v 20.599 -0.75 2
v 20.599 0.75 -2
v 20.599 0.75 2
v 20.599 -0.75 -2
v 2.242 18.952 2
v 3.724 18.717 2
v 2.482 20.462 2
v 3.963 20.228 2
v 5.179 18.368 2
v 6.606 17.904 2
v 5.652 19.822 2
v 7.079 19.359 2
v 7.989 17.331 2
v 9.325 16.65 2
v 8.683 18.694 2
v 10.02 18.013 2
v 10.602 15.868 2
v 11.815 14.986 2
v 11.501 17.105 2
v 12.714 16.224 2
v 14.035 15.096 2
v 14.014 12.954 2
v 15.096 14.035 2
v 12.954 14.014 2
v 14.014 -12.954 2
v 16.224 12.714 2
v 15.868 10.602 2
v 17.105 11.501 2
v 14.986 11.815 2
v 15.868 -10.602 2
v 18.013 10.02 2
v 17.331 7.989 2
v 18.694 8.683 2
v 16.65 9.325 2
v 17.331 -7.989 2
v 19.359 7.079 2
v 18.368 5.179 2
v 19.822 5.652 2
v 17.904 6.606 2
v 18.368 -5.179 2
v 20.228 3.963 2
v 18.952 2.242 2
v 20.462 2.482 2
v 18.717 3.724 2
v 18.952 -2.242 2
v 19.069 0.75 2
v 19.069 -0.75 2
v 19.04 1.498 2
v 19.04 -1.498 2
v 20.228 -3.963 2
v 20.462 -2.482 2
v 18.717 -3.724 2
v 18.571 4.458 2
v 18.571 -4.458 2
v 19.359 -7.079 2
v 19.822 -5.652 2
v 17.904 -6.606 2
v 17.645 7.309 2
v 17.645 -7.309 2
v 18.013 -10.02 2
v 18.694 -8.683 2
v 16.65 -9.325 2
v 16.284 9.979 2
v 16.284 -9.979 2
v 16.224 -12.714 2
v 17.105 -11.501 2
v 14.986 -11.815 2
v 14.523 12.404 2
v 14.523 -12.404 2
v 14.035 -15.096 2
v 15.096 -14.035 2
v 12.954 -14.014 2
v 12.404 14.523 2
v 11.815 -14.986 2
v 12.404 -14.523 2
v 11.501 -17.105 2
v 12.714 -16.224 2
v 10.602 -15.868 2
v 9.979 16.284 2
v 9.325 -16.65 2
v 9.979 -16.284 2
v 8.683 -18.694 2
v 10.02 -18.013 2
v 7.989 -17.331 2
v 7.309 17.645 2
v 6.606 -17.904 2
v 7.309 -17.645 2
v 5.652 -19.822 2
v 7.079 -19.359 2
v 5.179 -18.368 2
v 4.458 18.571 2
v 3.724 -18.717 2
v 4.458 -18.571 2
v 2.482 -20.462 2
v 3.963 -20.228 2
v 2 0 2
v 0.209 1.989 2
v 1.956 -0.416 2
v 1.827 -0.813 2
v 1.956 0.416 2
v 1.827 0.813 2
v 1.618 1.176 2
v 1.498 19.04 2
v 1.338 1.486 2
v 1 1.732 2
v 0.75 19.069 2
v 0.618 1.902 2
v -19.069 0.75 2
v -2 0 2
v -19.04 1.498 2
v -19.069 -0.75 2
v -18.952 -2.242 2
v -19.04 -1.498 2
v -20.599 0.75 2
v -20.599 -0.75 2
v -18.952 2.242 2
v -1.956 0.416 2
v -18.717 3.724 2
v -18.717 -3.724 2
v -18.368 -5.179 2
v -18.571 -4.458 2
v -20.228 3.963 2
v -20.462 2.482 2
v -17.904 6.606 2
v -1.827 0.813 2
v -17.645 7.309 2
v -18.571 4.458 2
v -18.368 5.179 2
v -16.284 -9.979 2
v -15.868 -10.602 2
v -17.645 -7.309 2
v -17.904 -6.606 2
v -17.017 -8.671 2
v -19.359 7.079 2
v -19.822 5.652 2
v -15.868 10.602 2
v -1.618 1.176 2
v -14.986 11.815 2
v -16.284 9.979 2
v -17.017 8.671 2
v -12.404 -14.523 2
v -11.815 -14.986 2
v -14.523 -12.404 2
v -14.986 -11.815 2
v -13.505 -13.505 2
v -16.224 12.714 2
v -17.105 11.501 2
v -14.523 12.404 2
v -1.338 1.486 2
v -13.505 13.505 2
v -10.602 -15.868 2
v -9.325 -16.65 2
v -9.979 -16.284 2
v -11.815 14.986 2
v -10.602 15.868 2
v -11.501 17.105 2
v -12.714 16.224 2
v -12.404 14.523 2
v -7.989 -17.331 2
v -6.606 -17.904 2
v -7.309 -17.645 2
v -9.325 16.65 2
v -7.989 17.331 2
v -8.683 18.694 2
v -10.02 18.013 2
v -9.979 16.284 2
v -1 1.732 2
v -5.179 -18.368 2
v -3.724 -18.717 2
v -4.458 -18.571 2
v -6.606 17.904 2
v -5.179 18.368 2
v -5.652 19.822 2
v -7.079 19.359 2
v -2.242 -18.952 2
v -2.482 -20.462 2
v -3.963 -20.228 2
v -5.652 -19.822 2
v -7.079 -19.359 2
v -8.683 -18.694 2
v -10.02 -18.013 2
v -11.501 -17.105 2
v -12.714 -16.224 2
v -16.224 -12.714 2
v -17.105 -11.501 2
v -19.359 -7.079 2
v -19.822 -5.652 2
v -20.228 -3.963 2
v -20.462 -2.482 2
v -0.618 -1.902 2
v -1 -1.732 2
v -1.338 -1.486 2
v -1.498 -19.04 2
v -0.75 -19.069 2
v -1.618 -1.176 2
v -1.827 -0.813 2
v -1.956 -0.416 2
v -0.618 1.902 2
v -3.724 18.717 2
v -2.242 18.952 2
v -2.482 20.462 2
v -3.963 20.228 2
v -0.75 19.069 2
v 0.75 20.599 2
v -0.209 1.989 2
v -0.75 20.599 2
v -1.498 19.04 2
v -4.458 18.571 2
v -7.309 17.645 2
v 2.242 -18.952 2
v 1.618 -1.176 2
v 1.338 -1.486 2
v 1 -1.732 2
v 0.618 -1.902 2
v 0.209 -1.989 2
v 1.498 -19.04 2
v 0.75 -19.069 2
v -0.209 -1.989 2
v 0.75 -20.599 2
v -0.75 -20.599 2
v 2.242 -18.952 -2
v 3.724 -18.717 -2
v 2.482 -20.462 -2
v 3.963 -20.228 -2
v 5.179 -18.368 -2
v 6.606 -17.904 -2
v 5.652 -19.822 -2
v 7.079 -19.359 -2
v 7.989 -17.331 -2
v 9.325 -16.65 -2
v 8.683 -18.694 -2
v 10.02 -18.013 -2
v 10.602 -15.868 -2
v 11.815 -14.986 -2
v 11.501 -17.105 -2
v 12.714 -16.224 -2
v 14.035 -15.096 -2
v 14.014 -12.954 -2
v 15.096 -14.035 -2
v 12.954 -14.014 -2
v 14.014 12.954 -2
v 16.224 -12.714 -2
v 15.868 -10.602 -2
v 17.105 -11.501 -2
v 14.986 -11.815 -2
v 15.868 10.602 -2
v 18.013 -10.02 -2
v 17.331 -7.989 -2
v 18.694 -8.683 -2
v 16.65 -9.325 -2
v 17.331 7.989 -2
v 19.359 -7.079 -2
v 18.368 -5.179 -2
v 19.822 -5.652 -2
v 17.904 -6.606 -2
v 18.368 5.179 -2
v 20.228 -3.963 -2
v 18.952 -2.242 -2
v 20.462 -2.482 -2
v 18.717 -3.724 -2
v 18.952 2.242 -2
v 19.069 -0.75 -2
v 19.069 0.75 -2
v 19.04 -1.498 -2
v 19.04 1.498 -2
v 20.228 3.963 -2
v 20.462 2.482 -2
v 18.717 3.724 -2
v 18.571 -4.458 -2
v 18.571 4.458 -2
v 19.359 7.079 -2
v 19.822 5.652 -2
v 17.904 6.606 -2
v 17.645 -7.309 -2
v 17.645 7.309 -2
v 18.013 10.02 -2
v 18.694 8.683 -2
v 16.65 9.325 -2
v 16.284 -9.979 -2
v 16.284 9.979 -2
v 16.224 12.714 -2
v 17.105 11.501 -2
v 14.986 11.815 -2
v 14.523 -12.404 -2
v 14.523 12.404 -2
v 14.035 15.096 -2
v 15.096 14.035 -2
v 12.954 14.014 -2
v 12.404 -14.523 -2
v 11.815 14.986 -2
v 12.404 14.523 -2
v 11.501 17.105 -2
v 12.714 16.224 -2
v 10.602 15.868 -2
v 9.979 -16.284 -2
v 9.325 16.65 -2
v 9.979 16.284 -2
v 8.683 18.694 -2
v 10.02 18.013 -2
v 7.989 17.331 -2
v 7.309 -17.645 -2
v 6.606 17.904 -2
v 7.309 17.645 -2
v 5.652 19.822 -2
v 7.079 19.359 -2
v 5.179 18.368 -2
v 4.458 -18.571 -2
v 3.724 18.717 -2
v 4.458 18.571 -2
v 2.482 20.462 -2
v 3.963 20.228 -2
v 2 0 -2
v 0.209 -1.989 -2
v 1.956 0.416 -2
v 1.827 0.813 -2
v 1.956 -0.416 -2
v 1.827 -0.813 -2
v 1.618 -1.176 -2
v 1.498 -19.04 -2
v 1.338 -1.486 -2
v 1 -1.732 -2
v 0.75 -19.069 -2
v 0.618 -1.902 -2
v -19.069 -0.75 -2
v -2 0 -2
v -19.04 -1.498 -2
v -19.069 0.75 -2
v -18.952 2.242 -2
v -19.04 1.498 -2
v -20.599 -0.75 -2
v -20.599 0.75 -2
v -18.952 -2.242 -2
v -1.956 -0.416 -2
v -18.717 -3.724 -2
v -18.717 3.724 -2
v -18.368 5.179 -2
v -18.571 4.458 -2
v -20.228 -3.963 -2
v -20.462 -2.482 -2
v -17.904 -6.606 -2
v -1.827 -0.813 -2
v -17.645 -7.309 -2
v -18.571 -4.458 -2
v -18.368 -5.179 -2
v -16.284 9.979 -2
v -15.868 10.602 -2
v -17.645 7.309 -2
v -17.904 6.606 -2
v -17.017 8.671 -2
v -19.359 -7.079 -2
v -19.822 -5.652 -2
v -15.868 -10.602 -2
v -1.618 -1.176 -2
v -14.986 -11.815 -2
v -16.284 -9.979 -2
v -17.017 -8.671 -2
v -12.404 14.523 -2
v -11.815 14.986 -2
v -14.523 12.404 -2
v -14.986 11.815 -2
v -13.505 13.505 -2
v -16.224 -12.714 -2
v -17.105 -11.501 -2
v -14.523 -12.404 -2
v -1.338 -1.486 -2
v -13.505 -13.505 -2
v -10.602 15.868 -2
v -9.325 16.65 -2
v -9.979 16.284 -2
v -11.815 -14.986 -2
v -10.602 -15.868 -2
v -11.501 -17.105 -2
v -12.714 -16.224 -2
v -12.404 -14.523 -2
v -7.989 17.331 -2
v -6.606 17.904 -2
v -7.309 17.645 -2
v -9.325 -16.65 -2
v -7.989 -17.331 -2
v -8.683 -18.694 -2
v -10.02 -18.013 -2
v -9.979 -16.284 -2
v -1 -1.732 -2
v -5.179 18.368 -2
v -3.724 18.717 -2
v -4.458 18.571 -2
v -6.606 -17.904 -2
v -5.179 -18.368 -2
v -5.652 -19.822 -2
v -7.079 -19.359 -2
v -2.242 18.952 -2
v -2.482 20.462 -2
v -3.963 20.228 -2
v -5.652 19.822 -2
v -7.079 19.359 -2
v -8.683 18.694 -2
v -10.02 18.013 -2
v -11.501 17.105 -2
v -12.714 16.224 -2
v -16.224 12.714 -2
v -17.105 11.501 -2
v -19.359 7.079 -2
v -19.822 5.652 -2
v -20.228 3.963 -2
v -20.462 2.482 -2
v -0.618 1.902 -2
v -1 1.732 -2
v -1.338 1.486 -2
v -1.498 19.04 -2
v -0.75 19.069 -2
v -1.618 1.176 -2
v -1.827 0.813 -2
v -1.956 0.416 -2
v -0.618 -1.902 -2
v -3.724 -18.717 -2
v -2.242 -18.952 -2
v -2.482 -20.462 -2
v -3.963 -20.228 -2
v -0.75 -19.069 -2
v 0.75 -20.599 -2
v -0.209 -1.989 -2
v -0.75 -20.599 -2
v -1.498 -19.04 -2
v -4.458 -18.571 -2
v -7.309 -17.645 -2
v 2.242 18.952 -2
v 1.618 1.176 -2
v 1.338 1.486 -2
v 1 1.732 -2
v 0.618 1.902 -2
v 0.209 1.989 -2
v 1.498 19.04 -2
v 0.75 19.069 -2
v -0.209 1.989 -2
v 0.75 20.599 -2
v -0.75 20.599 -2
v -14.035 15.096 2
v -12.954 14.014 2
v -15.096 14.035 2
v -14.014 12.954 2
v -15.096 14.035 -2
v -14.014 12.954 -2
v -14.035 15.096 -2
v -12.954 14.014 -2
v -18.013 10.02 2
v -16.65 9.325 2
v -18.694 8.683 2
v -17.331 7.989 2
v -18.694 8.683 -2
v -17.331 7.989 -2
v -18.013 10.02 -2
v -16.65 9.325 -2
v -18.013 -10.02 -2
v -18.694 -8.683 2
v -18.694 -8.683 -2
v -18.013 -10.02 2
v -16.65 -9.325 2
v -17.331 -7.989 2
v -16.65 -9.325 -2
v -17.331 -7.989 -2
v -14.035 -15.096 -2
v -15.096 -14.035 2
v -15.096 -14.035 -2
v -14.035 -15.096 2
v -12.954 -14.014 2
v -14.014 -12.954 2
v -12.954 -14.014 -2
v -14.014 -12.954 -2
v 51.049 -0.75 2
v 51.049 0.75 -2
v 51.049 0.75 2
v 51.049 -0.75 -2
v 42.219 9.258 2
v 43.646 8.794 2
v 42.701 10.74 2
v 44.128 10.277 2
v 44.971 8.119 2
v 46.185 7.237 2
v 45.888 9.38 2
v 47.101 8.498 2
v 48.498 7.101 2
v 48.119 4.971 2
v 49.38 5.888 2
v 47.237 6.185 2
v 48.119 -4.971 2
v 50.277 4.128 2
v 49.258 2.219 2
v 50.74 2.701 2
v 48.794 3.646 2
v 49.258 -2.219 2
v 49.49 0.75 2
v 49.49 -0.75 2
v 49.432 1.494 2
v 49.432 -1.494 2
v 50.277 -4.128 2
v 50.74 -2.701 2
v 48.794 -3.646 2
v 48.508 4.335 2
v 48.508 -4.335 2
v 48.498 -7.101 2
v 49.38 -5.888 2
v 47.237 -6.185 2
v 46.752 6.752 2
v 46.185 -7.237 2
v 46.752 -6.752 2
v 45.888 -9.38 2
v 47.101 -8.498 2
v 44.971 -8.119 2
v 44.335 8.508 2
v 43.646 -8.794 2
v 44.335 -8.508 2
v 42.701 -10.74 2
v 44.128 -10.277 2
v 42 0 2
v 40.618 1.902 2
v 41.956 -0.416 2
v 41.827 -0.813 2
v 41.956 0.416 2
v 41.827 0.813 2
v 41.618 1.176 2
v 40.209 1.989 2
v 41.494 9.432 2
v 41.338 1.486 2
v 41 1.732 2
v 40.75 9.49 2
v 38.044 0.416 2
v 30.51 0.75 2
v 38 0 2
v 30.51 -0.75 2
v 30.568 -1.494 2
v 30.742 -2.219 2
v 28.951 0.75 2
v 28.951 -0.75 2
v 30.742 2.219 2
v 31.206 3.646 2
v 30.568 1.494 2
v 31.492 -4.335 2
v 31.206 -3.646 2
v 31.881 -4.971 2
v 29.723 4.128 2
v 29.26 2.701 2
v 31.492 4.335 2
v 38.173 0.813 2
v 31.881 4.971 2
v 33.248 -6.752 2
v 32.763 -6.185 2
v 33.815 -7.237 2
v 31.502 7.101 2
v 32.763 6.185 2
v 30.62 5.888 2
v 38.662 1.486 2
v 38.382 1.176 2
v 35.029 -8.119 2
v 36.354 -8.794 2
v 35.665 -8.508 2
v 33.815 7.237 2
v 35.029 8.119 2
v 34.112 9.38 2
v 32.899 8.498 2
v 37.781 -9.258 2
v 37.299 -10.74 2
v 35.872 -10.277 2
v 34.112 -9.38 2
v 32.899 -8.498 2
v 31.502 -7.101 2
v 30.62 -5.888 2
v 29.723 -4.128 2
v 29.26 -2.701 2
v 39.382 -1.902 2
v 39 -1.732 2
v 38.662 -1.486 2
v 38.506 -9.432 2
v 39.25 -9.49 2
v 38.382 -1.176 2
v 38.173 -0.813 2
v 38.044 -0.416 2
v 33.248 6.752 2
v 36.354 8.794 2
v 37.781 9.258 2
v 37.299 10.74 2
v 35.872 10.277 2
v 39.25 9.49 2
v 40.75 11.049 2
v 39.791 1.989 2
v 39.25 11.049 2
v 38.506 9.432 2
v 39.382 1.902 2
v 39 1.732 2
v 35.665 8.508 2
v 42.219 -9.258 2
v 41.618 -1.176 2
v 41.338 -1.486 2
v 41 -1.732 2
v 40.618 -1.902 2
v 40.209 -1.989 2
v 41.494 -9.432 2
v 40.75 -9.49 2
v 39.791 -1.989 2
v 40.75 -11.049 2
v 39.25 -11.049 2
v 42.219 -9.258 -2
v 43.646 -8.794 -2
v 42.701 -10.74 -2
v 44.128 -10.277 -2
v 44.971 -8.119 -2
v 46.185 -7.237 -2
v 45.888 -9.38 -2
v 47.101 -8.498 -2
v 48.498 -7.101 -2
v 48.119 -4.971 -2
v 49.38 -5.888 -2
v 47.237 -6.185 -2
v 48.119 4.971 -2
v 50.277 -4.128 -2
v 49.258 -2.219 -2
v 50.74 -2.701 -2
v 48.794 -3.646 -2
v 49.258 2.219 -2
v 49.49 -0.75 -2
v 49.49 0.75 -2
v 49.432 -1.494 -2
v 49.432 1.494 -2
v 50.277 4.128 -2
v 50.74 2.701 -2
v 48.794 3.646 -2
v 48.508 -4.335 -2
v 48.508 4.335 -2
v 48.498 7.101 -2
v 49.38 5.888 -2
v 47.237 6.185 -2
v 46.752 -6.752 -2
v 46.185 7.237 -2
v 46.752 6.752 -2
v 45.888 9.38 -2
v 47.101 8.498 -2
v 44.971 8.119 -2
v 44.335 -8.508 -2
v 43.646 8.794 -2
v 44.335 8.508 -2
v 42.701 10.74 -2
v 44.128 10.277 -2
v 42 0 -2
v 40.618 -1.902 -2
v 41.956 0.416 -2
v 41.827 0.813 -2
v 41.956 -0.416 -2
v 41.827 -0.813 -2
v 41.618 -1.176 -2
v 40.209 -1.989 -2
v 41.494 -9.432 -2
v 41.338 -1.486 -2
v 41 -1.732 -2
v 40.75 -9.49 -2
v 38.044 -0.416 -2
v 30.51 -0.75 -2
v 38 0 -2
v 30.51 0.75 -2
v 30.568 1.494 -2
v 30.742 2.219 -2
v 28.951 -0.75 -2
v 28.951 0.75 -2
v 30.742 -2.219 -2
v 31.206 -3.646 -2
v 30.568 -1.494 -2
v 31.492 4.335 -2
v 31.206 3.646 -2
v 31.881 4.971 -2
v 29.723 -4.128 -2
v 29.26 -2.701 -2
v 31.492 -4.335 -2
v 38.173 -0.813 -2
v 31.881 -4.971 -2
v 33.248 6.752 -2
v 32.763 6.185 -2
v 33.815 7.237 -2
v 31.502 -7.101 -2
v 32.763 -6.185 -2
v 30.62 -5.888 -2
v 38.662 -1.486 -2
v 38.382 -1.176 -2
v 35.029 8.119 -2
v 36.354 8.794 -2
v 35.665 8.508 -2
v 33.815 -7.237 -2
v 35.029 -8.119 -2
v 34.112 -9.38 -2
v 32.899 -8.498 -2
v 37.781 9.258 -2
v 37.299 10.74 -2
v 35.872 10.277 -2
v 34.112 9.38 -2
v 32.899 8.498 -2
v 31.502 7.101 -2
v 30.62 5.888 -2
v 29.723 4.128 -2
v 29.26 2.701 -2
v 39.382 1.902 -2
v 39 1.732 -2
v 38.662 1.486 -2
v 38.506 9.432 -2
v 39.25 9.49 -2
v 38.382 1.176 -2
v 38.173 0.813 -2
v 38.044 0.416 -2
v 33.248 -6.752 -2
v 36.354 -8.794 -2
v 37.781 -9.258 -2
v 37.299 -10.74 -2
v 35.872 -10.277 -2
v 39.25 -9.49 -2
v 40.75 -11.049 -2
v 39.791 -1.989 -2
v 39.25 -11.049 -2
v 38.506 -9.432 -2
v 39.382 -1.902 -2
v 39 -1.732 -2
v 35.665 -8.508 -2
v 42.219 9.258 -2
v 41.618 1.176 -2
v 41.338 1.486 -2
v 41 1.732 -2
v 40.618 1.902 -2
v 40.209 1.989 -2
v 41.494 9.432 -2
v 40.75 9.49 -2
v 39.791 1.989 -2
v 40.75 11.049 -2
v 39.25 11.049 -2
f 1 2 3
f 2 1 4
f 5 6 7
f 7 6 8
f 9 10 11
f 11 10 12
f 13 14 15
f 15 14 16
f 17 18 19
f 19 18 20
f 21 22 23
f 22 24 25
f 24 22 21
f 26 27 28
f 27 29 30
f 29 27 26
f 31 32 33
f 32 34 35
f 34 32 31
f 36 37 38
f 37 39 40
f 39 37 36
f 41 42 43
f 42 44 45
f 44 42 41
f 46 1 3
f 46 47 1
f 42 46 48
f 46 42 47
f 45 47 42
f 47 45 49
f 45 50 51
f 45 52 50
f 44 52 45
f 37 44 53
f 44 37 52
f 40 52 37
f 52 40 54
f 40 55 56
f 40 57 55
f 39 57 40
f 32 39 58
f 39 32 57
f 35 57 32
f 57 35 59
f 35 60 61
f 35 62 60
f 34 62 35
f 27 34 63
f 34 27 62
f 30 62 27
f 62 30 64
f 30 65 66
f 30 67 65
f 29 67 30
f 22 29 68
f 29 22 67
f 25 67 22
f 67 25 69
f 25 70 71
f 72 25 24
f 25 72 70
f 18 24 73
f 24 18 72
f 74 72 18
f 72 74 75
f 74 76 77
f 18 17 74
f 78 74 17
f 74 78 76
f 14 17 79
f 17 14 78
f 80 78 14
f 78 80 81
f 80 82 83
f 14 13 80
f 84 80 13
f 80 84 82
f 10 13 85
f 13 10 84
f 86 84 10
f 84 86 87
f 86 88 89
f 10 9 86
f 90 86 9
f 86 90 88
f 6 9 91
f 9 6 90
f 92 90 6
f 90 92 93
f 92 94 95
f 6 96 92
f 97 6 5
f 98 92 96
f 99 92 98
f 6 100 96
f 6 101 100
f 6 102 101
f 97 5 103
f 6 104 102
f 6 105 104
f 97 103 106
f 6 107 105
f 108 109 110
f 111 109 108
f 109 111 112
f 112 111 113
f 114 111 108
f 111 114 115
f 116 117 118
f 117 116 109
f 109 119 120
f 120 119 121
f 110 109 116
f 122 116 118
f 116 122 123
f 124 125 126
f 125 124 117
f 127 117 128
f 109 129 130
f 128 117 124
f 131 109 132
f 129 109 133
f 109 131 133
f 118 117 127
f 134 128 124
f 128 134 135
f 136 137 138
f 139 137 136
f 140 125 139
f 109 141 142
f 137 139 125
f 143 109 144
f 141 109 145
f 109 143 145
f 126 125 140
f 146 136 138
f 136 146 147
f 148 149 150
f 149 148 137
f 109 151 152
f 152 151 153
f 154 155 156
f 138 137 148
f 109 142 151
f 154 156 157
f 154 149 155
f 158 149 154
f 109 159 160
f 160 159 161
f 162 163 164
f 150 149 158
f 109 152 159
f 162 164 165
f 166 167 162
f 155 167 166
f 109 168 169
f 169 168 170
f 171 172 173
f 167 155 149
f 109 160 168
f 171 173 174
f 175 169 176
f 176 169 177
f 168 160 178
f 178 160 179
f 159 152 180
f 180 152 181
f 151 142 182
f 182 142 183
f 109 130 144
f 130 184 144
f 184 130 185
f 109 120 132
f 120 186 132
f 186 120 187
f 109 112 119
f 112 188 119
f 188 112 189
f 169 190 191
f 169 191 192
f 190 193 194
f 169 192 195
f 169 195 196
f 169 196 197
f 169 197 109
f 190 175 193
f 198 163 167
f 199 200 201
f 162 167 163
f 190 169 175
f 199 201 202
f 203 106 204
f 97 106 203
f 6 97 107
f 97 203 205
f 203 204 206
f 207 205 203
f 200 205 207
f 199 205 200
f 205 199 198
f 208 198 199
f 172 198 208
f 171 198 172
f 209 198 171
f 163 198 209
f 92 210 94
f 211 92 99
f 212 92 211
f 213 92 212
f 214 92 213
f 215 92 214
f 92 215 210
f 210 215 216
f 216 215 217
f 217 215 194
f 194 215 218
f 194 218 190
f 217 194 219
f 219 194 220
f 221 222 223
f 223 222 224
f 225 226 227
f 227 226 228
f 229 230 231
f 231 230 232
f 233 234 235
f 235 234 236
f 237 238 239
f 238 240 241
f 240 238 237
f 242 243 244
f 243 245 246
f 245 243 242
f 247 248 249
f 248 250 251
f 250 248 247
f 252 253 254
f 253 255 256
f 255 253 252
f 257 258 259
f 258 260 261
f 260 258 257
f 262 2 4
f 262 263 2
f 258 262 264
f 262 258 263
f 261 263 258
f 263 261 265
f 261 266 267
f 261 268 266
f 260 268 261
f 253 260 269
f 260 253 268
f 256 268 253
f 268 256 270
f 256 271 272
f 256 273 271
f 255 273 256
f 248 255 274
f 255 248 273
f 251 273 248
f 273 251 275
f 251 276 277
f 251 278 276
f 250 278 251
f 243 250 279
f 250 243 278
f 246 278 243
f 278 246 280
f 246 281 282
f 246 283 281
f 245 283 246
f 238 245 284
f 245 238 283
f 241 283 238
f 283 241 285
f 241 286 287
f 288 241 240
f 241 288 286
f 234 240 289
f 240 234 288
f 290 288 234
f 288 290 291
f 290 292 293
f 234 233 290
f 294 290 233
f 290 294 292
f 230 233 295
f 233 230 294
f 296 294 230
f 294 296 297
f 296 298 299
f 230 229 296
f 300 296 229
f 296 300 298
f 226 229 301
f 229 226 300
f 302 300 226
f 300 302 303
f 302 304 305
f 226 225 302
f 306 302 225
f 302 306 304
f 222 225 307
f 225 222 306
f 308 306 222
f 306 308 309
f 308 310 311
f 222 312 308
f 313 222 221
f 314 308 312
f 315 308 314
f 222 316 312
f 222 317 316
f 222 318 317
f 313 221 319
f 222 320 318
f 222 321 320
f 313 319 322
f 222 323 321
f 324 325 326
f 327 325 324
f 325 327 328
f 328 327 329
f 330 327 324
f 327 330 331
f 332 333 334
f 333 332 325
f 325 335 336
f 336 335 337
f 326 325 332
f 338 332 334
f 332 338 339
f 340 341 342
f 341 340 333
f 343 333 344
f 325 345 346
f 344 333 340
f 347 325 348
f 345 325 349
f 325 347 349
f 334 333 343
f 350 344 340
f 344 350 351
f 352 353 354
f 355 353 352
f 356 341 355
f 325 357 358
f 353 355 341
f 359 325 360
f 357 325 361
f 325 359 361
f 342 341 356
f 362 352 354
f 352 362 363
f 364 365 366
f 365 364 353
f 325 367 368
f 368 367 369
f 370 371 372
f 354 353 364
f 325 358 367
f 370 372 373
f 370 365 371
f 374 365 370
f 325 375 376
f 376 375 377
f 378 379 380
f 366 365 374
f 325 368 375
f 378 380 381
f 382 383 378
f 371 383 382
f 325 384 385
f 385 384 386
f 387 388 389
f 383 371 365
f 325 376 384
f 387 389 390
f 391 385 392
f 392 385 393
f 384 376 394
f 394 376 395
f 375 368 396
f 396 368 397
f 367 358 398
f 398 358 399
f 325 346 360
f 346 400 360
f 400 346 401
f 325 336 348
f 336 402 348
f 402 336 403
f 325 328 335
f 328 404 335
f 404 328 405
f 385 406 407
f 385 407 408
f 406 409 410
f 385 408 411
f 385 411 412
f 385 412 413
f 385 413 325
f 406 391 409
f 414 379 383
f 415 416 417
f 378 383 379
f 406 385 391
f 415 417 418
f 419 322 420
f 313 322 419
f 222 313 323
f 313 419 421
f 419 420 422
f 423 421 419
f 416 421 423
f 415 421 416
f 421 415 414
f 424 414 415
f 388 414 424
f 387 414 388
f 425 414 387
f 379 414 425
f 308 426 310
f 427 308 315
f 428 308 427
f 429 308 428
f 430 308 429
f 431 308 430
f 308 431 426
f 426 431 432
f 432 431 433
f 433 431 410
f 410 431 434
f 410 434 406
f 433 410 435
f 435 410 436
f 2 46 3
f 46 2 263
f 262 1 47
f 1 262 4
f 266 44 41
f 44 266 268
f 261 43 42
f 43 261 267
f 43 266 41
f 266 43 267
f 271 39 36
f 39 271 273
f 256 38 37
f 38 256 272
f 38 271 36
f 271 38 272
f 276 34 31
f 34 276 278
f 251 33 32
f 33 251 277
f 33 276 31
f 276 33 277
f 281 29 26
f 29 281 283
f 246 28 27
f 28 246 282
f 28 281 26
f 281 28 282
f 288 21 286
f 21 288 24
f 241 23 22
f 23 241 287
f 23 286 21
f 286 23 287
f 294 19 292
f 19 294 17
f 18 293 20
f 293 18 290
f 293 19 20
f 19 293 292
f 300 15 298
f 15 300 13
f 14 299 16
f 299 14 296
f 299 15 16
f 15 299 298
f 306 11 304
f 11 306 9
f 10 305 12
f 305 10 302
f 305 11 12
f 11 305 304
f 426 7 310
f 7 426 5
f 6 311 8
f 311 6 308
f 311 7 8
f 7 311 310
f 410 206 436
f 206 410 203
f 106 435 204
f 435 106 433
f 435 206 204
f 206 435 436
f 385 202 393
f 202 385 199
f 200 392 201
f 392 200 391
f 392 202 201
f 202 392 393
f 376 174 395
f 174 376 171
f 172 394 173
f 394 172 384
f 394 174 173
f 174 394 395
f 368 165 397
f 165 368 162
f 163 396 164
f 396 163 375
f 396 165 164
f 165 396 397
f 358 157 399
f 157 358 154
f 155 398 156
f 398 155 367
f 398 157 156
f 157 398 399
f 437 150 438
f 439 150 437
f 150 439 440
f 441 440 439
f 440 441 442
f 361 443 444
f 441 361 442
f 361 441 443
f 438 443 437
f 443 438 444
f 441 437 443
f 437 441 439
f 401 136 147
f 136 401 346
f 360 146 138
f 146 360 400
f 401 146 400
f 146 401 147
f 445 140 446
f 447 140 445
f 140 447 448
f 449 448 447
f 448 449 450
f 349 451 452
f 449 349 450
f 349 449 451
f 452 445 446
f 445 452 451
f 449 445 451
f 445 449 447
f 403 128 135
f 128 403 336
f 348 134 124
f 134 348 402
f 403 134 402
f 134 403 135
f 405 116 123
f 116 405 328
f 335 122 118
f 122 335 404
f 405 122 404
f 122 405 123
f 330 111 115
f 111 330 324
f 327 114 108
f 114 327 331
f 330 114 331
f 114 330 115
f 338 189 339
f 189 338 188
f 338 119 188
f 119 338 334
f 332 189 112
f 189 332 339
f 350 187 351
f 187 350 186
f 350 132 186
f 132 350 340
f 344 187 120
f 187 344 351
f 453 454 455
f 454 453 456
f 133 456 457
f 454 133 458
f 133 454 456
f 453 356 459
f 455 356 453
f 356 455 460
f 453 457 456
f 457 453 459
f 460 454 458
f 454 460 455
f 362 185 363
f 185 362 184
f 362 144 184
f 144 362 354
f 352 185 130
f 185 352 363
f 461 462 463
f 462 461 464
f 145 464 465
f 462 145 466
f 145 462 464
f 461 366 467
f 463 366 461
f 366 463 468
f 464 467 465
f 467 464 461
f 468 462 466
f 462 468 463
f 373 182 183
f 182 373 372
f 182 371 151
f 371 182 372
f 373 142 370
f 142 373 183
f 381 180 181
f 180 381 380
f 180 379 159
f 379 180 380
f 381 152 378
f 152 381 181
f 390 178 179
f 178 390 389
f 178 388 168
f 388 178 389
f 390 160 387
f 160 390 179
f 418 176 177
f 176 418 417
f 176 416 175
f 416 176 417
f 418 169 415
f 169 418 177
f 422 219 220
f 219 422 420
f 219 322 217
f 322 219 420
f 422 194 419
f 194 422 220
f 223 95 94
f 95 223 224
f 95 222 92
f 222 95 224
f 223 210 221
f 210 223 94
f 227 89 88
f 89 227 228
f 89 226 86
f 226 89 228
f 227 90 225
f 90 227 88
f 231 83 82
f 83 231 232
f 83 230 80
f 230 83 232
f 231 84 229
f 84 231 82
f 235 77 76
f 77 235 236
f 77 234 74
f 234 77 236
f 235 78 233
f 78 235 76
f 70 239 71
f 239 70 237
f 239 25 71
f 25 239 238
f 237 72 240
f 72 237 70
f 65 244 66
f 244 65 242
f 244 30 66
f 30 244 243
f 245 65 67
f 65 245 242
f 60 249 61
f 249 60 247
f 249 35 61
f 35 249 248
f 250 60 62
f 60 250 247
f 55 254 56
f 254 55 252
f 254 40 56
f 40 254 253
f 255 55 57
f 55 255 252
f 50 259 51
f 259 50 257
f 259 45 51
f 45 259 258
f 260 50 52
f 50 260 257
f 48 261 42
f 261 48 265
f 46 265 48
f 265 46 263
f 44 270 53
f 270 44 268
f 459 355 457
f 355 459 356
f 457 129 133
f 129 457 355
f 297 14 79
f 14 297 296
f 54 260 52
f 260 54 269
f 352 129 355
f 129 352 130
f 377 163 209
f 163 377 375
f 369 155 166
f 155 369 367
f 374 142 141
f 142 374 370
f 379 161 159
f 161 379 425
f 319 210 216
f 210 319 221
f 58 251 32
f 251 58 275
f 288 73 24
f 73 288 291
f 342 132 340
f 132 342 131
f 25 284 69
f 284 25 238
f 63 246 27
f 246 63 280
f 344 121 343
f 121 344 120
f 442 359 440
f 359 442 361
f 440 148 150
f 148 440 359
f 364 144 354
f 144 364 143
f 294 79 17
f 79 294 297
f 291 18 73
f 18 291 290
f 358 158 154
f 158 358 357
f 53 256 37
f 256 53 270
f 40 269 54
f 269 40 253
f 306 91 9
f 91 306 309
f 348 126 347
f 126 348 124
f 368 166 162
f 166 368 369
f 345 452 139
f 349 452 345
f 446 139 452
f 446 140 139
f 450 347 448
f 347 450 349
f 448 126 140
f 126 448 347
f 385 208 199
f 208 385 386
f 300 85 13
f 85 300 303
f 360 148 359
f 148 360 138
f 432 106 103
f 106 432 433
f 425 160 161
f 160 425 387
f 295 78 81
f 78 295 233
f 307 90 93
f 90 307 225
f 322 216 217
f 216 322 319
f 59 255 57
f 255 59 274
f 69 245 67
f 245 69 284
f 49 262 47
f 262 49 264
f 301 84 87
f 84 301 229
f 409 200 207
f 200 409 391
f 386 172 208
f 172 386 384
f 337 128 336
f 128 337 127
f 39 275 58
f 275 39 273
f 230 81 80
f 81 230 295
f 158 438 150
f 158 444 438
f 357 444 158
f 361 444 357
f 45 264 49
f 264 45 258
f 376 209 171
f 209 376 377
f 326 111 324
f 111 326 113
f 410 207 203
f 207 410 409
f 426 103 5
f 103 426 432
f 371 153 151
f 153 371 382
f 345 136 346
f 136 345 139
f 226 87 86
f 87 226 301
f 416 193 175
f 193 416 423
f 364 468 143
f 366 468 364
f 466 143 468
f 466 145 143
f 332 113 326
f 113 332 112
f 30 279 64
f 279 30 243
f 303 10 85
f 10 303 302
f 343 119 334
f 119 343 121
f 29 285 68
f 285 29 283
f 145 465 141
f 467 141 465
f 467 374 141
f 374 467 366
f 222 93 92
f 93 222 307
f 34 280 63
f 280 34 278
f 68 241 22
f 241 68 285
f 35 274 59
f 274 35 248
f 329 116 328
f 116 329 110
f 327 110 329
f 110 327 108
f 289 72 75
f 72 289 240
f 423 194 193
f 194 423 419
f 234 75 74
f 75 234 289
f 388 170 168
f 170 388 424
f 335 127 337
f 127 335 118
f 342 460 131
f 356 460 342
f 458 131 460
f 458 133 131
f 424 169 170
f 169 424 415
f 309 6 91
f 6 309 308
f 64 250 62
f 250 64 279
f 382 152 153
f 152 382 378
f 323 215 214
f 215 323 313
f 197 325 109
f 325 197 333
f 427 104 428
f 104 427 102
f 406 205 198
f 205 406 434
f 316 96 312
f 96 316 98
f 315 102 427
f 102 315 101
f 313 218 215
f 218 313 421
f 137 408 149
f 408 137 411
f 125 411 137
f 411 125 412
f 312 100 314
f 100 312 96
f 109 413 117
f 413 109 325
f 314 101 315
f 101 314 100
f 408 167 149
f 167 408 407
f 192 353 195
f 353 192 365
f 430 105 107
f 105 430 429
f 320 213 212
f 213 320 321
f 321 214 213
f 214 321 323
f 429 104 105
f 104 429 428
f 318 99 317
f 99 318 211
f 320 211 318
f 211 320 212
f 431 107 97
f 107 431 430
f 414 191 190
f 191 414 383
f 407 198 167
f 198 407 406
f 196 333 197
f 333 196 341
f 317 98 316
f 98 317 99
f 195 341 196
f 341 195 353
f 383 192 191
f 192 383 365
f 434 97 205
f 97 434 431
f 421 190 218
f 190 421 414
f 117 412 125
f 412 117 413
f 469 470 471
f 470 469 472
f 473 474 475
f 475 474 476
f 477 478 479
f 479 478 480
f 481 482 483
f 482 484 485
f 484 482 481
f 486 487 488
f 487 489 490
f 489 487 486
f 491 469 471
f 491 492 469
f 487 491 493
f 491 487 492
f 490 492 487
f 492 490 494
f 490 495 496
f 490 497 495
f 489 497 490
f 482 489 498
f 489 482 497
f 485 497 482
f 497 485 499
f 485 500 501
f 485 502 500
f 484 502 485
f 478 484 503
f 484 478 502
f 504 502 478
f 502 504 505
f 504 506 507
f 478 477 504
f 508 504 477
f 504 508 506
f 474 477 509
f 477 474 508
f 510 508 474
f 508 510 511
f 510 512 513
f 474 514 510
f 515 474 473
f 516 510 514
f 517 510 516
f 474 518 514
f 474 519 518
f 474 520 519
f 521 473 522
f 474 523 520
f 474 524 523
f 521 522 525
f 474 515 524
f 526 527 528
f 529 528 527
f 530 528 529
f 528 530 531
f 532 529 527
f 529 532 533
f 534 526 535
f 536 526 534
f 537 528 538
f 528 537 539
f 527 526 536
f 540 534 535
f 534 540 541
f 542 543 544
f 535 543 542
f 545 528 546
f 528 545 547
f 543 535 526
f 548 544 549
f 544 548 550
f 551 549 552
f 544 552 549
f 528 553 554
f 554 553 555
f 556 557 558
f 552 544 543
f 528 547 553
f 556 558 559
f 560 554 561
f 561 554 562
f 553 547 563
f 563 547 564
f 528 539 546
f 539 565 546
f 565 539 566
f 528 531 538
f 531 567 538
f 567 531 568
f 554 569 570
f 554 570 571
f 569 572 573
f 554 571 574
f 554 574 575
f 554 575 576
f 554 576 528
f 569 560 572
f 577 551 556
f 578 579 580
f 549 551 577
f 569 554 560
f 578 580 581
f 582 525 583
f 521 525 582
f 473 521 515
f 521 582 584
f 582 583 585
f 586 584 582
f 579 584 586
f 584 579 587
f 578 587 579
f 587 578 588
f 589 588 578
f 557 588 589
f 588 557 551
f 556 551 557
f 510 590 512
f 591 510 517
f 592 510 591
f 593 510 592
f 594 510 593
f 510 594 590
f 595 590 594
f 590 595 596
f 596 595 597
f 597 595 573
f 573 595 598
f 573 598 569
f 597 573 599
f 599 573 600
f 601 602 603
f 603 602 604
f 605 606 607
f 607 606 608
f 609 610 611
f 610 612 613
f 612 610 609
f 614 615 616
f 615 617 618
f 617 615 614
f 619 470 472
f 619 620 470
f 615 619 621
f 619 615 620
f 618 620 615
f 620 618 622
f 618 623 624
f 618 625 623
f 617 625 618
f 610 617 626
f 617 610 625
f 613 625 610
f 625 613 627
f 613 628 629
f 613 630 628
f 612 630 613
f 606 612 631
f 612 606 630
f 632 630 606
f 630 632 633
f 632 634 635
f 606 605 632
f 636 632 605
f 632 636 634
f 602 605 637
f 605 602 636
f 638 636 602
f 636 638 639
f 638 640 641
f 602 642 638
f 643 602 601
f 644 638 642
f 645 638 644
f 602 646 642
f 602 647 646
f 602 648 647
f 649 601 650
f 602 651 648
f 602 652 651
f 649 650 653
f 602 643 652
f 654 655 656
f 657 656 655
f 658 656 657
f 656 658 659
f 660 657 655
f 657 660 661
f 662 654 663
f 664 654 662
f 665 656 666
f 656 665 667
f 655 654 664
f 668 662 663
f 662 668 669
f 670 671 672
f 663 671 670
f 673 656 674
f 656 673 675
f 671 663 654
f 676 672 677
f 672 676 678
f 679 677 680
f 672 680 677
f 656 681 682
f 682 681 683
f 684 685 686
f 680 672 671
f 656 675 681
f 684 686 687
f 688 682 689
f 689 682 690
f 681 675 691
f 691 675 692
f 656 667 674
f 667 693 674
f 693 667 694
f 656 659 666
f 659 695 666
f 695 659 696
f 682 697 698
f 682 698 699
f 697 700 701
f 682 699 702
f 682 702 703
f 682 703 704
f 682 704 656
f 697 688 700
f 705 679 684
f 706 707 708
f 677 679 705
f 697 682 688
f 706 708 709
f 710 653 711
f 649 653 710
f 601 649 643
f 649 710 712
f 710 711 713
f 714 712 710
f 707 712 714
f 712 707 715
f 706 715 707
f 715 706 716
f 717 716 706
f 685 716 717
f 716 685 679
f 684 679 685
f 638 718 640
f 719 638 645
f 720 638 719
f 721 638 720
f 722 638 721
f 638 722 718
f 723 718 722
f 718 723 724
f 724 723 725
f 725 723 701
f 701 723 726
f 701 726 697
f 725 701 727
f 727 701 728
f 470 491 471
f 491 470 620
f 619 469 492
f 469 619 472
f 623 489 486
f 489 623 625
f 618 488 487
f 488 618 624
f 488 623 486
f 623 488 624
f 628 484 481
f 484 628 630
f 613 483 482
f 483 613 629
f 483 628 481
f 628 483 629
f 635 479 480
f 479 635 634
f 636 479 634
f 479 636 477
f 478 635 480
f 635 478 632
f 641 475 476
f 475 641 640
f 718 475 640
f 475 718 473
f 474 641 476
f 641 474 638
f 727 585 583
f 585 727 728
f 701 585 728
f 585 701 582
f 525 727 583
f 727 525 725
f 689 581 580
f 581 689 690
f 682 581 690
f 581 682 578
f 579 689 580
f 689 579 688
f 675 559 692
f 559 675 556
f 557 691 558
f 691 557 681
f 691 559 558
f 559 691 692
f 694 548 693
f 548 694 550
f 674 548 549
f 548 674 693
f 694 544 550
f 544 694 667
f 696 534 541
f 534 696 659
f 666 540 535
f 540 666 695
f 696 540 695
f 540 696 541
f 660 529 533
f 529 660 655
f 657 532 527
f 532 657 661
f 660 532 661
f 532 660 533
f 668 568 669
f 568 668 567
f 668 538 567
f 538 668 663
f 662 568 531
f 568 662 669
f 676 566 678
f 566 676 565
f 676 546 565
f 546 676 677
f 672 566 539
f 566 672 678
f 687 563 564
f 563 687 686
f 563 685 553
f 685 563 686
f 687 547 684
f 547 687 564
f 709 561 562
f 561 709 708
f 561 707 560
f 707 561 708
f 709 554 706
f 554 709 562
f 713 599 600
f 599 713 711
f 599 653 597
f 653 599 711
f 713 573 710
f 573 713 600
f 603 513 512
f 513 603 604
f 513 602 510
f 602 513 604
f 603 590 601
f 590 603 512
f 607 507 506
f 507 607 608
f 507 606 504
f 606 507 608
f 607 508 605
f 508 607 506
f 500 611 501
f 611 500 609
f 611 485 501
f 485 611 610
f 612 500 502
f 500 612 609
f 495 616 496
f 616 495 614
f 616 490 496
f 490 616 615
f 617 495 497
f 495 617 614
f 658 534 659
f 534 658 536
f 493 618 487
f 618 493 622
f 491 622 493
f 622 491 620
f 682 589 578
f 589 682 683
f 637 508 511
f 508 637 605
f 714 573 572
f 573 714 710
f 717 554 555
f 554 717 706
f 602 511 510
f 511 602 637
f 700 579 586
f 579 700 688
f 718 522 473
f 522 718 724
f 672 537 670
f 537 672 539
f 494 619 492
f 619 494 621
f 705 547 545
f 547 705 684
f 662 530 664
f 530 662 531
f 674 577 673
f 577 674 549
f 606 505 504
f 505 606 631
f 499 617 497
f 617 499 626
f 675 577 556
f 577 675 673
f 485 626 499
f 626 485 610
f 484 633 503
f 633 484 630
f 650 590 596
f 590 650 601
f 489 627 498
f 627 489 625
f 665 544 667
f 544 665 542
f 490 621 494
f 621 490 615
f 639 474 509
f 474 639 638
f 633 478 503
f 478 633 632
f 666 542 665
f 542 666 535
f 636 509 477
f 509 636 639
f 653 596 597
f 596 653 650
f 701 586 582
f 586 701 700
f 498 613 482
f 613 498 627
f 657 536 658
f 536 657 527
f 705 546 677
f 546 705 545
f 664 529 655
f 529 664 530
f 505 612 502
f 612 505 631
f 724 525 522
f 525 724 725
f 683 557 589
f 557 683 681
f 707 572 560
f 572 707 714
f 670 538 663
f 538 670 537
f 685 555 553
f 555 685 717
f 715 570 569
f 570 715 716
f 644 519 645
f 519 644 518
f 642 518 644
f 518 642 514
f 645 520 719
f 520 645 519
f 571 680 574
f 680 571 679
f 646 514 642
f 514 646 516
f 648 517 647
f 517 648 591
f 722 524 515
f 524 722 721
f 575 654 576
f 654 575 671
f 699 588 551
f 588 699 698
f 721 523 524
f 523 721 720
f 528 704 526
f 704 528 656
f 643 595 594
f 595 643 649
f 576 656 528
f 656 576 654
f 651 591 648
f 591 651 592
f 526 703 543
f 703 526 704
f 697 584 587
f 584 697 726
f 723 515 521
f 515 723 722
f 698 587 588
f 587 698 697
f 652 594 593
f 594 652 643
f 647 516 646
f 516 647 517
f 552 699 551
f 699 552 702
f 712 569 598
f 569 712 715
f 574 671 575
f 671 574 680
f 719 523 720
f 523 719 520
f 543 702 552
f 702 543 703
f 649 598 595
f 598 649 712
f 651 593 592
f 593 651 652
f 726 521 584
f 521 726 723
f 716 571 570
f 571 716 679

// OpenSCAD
// file: GearsGenerator0_1.scad
module GearGenerator(teethQuantity, teethLength, height){
    perimeter= teethLength*teethQuantity;
    radius = perimeter/(2*PI);
    echo("Dientes:");
    echo(teethQuantity);
    angle = 360/(teethQuantity);
    union(){
        cylinder(h=height, r=radius, center = true, $fn = teethQuantity*2);
        
        for(i=[0:1:teethQuantity]){
            rotate(a = (angle)*i){
                translate([radius, 0, 0]){
                    cube([teethLength, teethLength/2, height], center = true);
                }
            }
        }
    }
}



/*
difference(){
    GearGenerator(40, 3, 4);
    cylinder(h=4.1, r=2, center = true, $fn=30);
}
*/

/*
translate([40,0,0]){
    difference(){
        GearGenerator(20, 3, 4);
        cylinder(h=4.1, r=2, center = true, $fn=30);
    }
}
*/
// main file
include <GearsGenerator0_1.scad>

difference(){
    GearGenerator(40, 3, 4);
    cylinder(h=4.1, r=2, center = true, $fn=30);
}

translate([40,0,0]){
    difference(){
        GearGenerator(20, 3, 4);
        cylinder(h=4.1, r=2, center = true, $fn=30);
    }
}
